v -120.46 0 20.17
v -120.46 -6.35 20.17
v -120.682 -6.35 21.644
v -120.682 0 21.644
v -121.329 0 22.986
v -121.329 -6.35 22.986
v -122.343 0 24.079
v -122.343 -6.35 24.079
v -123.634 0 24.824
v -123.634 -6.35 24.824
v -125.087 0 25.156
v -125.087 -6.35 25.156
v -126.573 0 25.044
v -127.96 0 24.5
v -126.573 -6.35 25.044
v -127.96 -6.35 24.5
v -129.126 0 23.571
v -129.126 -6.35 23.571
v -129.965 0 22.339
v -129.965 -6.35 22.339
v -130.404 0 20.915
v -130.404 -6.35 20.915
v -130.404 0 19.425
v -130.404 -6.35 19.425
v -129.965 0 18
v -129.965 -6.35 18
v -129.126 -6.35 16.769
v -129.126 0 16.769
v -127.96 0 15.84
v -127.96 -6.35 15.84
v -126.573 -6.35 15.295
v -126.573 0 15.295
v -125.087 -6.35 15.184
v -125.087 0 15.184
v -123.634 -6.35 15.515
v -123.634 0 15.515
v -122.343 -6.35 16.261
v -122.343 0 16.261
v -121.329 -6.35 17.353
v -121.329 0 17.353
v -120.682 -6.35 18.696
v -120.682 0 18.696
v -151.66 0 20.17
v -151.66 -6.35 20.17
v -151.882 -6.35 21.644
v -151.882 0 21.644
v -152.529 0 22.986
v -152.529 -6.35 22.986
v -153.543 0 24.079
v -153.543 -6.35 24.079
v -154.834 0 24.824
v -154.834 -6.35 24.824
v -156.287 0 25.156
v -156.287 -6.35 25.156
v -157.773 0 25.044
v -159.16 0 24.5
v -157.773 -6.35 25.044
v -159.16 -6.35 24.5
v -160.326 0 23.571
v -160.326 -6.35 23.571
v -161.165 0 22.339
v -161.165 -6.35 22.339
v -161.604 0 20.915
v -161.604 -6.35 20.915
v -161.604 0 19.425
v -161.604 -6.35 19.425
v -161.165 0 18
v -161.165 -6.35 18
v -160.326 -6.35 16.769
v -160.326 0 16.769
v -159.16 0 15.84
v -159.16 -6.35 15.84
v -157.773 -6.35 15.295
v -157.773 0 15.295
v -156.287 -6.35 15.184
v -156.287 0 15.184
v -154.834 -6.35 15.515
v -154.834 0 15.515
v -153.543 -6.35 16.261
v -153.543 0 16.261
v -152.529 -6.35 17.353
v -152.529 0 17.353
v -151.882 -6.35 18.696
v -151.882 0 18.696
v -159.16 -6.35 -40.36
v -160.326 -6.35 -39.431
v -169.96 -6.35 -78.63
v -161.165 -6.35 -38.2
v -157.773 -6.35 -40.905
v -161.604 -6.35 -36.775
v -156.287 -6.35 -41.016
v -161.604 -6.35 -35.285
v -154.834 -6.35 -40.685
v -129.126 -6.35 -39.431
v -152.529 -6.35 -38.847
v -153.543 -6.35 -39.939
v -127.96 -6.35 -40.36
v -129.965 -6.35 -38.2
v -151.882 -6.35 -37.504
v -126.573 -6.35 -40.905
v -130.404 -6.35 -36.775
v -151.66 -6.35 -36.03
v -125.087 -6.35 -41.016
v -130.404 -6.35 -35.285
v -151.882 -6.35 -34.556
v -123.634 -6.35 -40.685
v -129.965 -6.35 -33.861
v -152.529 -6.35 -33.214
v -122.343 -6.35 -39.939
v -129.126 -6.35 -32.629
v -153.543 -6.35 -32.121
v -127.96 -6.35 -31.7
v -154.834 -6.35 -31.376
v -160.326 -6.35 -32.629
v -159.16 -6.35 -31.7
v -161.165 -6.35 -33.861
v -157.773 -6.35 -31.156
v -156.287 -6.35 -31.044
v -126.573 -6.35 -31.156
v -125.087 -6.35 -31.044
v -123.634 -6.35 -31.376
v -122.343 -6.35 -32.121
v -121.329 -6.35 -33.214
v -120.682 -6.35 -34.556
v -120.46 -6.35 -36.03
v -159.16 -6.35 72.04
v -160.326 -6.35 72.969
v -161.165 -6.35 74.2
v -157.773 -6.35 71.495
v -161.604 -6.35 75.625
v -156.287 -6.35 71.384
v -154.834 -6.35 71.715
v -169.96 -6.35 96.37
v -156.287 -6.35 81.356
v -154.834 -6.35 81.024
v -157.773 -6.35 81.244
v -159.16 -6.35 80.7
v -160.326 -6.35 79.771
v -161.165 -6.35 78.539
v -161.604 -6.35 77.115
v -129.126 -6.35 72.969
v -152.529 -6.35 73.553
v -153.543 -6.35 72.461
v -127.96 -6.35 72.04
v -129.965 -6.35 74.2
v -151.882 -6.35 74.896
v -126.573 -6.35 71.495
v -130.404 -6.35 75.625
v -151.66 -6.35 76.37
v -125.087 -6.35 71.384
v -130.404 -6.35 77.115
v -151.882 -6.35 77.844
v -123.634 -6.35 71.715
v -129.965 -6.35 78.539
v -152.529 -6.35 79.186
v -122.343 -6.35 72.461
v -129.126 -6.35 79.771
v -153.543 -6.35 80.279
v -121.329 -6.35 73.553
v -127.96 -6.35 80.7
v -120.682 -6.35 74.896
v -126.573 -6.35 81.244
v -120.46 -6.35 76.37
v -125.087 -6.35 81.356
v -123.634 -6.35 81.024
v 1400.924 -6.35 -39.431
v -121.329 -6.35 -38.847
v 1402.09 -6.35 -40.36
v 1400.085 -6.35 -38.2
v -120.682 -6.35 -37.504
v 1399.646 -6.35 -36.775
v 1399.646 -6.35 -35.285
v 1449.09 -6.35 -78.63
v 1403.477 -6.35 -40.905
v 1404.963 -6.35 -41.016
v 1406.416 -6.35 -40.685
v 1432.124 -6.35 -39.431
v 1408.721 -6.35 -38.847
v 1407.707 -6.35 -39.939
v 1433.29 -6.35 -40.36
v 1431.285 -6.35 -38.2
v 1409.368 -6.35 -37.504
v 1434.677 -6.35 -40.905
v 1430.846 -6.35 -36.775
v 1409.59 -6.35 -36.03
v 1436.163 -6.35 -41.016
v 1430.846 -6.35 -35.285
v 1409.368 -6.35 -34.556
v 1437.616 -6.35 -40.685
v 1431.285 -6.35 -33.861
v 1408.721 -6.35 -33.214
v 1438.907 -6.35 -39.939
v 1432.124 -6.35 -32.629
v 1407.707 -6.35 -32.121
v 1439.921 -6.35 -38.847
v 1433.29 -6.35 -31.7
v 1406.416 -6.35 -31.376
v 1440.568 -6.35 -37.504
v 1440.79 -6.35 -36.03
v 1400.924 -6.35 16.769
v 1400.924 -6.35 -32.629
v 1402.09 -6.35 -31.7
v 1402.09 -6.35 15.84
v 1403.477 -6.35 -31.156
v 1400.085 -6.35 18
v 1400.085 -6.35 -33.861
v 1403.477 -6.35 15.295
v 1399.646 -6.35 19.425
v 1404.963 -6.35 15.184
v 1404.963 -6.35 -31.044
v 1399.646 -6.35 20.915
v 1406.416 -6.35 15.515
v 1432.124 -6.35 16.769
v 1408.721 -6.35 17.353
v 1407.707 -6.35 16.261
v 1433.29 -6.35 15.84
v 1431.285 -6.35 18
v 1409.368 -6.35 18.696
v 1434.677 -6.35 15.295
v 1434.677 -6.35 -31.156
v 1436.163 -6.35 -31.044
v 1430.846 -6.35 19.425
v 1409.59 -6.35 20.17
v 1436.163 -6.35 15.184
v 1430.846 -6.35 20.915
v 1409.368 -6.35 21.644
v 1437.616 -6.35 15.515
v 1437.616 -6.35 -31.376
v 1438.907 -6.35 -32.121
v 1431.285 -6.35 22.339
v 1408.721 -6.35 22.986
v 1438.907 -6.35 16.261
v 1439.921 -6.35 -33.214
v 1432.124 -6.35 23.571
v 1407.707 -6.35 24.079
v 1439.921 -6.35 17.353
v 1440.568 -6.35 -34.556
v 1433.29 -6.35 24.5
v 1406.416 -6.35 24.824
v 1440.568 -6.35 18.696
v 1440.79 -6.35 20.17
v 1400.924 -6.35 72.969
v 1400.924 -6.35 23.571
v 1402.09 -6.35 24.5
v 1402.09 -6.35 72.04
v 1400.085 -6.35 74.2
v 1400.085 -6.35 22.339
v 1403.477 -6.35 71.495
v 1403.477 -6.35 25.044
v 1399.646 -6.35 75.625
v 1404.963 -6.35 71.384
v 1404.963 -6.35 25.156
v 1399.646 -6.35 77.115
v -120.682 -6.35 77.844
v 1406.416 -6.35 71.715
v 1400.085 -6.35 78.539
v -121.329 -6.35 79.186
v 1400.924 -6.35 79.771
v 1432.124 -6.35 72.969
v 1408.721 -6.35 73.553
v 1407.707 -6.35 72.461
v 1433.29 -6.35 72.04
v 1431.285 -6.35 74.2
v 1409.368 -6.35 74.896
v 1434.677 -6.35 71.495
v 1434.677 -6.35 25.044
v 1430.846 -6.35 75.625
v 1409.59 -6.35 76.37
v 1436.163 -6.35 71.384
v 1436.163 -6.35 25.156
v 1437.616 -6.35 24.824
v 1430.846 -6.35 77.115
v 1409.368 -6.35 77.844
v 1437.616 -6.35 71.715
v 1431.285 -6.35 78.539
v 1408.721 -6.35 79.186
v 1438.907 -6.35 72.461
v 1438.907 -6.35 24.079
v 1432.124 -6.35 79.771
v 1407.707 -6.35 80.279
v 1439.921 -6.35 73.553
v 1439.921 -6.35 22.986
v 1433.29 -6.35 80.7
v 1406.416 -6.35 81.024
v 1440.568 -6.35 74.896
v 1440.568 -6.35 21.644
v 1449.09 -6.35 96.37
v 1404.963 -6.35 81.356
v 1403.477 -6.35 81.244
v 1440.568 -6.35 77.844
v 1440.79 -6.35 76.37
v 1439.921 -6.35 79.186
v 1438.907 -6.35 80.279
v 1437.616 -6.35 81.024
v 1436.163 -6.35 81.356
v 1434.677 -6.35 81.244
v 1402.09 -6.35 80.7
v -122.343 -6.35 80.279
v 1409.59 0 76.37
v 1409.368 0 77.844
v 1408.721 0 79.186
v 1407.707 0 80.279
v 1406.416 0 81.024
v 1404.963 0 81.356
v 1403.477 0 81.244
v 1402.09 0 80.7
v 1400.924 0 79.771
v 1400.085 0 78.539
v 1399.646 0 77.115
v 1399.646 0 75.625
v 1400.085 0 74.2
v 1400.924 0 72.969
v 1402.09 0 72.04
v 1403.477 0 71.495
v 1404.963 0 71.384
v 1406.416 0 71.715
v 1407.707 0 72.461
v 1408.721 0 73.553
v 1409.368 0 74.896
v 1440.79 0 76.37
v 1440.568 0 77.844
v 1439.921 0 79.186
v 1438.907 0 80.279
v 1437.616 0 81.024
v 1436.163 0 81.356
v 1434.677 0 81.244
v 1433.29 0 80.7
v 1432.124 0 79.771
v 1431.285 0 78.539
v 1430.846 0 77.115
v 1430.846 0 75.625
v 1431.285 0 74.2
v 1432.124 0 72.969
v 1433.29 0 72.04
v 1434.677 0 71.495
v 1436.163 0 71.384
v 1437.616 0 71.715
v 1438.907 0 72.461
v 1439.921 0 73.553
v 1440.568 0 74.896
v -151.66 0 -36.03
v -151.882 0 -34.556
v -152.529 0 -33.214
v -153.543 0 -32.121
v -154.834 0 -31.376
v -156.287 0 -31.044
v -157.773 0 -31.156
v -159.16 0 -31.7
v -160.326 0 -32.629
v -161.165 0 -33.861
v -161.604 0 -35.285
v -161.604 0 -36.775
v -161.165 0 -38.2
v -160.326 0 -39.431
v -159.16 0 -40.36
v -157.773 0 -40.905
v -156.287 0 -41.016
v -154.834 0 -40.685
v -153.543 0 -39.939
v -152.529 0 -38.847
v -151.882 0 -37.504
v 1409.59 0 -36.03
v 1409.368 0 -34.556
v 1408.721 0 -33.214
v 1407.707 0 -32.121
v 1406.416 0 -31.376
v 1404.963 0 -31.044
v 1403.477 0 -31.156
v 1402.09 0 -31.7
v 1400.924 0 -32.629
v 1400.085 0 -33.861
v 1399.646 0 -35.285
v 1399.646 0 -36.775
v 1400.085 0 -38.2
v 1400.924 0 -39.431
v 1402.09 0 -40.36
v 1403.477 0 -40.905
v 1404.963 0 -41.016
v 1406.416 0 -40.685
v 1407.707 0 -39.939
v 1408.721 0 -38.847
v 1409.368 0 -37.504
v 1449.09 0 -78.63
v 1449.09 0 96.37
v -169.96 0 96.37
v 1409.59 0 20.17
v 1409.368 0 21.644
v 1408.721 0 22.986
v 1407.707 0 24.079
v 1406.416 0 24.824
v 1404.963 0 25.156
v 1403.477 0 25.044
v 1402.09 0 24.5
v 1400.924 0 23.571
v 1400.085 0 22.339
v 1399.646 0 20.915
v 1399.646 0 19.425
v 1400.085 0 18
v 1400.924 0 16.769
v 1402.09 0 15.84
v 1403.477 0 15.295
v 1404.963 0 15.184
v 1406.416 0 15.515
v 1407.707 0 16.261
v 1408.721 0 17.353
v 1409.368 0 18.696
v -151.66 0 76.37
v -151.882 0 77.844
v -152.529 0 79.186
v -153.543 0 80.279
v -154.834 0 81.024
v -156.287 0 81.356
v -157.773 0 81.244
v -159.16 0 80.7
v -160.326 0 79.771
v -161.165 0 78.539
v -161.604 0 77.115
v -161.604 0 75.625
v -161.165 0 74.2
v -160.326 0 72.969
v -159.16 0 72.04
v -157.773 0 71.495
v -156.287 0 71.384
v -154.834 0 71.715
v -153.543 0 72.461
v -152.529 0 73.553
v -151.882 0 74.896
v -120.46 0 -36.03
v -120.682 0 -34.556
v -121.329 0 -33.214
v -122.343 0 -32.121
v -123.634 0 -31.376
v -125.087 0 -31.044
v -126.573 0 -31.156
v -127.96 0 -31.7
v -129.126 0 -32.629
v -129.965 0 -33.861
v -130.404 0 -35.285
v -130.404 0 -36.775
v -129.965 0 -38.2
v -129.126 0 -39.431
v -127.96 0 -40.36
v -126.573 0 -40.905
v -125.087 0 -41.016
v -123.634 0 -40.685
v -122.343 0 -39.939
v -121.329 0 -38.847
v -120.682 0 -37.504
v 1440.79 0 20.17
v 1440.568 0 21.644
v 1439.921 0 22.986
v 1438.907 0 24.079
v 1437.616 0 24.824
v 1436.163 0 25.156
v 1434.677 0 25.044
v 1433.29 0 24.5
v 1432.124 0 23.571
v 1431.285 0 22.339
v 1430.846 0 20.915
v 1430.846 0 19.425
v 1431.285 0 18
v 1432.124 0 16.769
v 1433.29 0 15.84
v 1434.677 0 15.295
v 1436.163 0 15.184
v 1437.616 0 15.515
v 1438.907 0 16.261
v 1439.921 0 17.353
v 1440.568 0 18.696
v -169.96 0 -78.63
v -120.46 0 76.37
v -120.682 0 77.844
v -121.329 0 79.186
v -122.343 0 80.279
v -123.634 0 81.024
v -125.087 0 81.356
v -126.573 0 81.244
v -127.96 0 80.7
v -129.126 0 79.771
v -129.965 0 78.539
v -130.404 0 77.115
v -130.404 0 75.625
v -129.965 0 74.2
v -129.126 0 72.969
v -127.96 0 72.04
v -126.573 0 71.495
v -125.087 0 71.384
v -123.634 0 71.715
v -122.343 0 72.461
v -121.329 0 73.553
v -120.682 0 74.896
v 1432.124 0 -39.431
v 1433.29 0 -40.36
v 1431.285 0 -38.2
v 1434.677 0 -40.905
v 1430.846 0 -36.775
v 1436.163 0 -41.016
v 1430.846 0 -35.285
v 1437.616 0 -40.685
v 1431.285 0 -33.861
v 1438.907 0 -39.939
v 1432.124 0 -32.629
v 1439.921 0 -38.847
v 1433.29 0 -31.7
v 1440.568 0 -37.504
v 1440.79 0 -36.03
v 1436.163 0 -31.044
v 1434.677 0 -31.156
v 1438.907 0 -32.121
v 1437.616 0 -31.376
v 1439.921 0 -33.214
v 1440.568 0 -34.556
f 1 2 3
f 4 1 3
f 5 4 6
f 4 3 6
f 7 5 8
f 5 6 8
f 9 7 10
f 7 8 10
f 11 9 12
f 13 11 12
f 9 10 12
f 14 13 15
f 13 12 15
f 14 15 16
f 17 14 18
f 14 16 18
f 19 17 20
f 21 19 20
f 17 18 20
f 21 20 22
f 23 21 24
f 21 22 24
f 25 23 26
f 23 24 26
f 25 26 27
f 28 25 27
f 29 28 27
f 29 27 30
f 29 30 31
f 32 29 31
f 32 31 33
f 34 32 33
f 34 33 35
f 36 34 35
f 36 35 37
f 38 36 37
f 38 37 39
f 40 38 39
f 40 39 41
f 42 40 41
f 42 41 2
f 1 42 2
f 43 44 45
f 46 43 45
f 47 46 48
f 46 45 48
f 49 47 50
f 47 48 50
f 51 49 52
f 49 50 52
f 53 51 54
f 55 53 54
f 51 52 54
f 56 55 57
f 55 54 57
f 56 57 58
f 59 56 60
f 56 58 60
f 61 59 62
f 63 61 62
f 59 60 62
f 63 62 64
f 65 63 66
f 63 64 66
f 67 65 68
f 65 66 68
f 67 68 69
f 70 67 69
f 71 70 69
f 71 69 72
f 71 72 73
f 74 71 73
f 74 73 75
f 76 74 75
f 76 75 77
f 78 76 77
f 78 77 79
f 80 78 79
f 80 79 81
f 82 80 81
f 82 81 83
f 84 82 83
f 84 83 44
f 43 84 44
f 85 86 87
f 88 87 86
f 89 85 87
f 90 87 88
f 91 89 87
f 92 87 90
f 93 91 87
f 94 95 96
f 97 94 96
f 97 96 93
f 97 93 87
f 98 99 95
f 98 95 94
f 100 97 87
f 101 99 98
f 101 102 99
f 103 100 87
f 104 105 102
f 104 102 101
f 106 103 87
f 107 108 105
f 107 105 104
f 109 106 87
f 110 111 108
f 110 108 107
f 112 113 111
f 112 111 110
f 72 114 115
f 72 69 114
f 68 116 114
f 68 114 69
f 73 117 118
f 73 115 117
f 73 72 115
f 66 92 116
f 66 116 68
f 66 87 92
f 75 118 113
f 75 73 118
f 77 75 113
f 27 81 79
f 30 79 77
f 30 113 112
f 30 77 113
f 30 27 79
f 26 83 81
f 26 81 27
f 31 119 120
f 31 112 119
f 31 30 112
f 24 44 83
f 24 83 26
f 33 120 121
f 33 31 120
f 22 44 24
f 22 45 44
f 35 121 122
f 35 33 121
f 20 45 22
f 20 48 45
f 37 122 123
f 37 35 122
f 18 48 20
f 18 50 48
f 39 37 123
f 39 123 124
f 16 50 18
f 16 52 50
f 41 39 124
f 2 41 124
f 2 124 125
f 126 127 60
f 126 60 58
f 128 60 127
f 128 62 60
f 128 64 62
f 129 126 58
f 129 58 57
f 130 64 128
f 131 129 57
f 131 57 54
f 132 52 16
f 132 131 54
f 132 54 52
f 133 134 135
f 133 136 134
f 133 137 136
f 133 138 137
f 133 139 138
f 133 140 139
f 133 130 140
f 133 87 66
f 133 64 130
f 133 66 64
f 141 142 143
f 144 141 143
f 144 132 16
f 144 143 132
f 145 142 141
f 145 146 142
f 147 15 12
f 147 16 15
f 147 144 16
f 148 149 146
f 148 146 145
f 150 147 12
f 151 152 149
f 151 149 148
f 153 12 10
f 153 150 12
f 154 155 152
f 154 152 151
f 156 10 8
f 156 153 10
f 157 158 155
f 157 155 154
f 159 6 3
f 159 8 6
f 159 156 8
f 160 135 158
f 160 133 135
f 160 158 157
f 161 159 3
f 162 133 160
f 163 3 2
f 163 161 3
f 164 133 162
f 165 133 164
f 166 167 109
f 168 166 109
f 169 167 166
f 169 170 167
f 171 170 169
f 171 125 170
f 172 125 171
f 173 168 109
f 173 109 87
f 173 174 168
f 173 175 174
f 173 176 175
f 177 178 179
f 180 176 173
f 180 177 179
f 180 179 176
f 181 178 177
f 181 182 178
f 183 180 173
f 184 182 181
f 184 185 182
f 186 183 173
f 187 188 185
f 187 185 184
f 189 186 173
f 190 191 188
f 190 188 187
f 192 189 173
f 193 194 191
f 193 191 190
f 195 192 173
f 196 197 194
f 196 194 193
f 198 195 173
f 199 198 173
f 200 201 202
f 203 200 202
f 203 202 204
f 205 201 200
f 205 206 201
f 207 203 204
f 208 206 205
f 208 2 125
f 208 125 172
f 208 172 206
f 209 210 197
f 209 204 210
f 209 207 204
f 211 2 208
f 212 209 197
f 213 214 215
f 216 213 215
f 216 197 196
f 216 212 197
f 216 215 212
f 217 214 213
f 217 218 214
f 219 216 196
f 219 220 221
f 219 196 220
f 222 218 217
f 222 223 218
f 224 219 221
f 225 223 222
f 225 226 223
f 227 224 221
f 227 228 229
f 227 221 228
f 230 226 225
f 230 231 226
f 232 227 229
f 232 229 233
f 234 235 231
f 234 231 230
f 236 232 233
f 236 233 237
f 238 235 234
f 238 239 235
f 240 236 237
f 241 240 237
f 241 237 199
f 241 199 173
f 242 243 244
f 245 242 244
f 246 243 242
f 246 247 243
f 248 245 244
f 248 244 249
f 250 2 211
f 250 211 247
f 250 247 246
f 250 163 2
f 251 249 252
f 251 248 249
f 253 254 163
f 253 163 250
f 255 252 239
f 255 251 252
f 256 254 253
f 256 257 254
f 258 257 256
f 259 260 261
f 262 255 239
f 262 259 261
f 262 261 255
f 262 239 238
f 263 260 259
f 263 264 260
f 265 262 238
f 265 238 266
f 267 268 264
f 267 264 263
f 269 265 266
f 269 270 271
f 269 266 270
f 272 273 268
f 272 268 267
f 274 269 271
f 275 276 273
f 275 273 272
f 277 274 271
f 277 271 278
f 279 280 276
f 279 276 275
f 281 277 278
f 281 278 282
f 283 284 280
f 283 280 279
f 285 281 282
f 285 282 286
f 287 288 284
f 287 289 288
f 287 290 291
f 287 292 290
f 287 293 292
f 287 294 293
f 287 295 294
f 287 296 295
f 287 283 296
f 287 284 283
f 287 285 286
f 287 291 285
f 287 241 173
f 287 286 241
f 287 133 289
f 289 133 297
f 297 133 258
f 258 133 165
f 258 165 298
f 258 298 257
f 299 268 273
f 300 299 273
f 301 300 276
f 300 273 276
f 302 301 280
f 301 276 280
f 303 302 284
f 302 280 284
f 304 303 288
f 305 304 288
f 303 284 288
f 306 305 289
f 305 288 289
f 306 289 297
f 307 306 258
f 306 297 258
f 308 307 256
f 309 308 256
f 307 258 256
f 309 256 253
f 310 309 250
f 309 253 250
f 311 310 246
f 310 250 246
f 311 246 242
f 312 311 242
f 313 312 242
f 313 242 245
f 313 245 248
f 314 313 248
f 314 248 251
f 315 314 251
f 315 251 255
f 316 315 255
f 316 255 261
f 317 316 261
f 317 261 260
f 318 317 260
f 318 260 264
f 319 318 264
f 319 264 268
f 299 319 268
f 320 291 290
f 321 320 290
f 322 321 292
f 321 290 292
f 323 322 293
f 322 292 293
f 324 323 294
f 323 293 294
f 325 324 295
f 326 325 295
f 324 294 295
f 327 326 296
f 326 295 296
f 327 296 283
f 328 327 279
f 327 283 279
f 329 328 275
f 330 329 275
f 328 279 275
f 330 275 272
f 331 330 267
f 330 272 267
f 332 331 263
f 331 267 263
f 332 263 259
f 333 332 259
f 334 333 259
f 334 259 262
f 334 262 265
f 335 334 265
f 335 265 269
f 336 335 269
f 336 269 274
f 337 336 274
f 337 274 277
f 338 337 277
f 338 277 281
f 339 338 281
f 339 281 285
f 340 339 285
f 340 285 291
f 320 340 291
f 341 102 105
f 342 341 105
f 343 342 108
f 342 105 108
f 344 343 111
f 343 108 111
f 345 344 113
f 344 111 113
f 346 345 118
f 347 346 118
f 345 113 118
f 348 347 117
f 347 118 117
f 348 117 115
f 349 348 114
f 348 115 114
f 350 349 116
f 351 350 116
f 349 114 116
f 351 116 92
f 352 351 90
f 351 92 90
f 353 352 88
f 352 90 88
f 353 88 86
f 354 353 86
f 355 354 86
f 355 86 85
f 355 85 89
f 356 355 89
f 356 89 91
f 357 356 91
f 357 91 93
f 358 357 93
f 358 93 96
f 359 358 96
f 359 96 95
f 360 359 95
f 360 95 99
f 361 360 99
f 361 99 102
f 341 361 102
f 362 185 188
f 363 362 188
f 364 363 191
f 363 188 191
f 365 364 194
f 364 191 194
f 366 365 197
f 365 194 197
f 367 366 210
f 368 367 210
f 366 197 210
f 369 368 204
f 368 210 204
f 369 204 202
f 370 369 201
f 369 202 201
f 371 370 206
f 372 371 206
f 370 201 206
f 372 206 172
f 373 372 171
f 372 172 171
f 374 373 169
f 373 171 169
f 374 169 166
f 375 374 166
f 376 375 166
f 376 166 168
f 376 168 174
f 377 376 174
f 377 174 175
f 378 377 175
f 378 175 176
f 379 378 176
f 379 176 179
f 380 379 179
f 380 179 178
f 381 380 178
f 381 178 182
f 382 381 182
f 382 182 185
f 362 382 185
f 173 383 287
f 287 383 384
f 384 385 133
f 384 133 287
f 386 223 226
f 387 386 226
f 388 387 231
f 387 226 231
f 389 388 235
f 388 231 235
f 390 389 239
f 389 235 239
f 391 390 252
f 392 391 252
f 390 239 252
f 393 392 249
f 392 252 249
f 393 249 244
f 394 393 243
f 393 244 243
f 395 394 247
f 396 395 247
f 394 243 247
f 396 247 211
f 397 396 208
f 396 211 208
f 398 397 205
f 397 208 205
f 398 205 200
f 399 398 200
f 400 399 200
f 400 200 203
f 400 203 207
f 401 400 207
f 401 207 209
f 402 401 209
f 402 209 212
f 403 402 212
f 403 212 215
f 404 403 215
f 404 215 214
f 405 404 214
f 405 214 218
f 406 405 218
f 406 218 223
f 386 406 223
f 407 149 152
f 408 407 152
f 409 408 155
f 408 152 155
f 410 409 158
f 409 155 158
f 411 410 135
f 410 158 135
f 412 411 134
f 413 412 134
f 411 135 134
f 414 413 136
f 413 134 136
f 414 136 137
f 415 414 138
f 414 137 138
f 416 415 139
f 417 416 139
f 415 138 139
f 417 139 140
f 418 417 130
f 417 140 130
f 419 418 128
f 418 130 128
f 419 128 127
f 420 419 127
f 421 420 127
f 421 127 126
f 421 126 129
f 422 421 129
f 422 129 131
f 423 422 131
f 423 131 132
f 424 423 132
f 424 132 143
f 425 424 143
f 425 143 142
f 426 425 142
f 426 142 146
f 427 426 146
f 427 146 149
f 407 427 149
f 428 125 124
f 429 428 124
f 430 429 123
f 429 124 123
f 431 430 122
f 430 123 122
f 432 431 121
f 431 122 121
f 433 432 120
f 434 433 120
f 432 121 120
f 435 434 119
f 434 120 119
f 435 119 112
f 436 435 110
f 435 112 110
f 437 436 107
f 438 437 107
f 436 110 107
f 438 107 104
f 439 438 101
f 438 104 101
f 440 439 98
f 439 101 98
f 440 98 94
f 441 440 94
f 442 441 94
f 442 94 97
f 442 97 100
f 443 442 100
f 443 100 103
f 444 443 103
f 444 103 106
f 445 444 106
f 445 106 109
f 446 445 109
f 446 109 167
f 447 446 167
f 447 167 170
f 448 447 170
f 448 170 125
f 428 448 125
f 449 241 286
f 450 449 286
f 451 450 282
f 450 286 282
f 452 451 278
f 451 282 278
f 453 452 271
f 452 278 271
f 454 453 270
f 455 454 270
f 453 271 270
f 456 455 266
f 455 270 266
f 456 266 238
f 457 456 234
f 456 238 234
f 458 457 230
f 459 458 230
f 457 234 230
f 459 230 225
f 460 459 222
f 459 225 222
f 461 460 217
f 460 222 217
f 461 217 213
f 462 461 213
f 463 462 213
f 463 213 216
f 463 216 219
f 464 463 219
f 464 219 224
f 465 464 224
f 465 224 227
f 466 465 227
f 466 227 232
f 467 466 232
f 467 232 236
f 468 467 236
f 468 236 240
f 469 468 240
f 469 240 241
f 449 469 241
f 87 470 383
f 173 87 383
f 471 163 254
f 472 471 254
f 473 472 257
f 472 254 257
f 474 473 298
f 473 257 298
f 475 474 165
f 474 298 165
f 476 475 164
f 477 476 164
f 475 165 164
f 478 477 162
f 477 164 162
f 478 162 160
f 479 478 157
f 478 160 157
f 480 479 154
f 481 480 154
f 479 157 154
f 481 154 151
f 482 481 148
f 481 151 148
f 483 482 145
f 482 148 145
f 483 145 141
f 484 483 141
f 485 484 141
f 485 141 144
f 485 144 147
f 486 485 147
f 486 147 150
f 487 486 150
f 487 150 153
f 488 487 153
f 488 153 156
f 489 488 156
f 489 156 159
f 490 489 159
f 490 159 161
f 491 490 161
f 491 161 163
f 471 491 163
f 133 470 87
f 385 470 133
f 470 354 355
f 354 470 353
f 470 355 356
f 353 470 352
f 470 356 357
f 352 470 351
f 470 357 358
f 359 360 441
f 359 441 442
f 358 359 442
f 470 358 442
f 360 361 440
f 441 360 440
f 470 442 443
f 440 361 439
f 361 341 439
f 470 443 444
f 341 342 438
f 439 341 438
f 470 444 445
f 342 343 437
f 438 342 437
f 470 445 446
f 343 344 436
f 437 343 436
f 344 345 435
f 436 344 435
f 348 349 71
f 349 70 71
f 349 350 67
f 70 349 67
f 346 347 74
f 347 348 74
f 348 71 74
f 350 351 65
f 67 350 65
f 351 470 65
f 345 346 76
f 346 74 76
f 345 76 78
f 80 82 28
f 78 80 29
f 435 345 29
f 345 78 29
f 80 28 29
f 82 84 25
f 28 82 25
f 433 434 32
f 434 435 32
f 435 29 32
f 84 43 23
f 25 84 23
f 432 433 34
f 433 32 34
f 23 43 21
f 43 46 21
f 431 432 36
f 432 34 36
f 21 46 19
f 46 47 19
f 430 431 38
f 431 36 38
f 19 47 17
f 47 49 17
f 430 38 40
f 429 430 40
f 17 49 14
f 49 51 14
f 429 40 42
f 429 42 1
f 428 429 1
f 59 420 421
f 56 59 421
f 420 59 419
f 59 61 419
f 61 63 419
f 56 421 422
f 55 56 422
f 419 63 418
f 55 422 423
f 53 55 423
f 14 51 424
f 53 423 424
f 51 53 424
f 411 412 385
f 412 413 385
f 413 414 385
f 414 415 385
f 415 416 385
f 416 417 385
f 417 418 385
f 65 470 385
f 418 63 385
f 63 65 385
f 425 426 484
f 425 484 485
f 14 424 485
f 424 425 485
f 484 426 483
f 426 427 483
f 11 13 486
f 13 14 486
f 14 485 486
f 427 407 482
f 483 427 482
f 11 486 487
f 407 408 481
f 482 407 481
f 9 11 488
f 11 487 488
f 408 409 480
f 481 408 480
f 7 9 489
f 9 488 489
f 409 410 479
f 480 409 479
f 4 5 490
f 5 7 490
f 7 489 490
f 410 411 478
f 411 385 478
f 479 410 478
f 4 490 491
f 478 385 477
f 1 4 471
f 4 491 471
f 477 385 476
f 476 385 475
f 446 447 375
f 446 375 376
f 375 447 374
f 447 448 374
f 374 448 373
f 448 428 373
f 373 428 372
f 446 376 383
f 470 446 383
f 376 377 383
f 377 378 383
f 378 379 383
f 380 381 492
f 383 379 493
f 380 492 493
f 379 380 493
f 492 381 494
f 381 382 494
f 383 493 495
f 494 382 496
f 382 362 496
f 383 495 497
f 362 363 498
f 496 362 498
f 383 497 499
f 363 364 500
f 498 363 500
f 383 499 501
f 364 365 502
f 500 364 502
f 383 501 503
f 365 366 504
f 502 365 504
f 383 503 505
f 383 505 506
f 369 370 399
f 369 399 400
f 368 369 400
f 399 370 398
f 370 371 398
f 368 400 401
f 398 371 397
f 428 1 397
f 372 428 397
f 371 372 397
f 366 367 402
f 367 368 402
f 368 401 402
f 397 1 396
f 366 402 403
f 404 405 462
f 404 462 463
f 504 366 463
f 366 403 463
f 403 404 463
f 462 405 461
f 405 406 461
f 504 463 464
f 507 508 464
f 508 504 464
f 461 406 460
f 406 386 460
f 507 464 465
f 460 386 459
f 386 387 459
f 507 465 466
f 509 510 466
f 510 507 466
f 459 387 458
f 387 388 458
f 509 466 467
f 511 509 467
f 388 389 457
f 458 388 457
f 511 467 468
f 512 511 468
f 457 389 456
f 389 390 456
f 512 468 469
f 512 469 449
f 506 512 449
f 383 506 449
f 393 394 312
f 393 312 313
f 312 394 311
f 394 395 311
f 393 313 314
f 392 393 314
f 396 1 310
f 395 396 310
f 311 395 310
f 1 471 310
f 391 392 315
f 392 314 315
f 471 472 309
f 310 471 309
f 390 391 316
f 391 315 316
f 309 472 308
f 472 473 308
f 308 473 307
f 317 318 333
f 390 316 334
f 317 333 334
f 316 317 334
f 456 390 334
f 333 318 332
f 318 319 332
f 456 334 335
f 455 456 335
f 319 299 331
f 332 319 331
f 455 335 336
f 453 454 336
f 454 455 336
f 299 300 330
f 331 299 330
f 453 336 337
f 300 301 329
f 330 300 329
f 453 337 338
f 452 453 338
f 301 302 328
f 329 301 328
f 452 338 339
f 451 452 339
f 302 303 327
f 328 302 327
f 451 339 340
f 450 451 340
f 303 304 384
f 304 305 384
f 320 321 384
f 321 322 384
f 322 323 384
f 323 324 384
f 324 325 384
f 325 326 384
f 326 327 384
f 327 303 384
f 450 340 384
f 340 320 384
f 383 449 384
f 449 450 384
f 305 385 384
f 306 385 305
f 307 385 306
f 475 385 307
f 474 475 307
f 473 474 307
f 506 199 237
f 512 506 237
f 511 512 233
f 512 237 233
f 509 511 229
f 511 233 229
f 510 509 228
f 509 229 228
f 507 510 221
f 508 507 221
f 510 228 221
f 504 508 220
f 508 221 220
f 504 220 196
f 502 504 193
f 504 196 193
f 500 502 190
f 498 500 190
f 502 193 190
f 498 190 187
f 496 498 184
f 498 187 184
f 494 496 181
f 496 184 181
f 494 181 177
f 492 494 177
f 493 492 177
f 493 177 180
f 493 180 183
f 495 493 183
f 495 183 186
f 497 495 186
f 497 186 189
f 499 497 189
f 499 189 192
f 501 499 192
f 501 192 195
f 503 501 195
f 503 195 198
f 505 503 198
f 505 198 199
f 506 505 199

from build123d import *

# Parameters (mm, degrees)
F0_W     = 1619.05
F0_H     = 175
F1_DEPTH = 6.35
F2_R     = 5
F3_DEPTH = 25


with BuildPart() as f1:
    # F0 (on Front) → F1 (new body)
    with BuildSketch(Plane.XZ):
        with Locations((639.564669, 8.86983)):
            Rectangle(F0_W, F0_H)
    extrude(amount=F1_DEPTH)

    # F2 (on face) → F3 (cut)
    with BuildSketch(Plane.XZ.offset(6.35)):
        with Locations((-156.660331, 20.16983)):
            Circle(F2_R)
        with Locations((-156.660331, -36.03017)):
            Circle(F2_R)
        with Locations((-125.460331, 76.36983)):
            Circle(F2_R)
        with Locations((-125.460331, 20.16983)):
            Circle(F2_R)
        with Locations((-125.460331, -36.03017)):
            Circle(F2_R)
        with Locations((-156.660331, 76.36983)):
            Circle(F2_R)
        with Locations((1404.589669, 76.36983)):
            Circle(F2_R)
        with Locations((1435.789669, 76.36983)):
            Circle(F2_R)
        with Locations((1404.589669, 20.16983)):
            Circle(F2_R)
        with Locations((1435.789669, 20.16983)):
            Circle(F2_R)
        with Locations((1435.789669, -36.03017)):
            Circle(F2_R)
        with Locations((1404.589669, -36.03017)):
            Circle(F2_R)
    extrude(amount=-F3_DEPTH, mode=Mode.SUBTRACT)


solid = f1.part
